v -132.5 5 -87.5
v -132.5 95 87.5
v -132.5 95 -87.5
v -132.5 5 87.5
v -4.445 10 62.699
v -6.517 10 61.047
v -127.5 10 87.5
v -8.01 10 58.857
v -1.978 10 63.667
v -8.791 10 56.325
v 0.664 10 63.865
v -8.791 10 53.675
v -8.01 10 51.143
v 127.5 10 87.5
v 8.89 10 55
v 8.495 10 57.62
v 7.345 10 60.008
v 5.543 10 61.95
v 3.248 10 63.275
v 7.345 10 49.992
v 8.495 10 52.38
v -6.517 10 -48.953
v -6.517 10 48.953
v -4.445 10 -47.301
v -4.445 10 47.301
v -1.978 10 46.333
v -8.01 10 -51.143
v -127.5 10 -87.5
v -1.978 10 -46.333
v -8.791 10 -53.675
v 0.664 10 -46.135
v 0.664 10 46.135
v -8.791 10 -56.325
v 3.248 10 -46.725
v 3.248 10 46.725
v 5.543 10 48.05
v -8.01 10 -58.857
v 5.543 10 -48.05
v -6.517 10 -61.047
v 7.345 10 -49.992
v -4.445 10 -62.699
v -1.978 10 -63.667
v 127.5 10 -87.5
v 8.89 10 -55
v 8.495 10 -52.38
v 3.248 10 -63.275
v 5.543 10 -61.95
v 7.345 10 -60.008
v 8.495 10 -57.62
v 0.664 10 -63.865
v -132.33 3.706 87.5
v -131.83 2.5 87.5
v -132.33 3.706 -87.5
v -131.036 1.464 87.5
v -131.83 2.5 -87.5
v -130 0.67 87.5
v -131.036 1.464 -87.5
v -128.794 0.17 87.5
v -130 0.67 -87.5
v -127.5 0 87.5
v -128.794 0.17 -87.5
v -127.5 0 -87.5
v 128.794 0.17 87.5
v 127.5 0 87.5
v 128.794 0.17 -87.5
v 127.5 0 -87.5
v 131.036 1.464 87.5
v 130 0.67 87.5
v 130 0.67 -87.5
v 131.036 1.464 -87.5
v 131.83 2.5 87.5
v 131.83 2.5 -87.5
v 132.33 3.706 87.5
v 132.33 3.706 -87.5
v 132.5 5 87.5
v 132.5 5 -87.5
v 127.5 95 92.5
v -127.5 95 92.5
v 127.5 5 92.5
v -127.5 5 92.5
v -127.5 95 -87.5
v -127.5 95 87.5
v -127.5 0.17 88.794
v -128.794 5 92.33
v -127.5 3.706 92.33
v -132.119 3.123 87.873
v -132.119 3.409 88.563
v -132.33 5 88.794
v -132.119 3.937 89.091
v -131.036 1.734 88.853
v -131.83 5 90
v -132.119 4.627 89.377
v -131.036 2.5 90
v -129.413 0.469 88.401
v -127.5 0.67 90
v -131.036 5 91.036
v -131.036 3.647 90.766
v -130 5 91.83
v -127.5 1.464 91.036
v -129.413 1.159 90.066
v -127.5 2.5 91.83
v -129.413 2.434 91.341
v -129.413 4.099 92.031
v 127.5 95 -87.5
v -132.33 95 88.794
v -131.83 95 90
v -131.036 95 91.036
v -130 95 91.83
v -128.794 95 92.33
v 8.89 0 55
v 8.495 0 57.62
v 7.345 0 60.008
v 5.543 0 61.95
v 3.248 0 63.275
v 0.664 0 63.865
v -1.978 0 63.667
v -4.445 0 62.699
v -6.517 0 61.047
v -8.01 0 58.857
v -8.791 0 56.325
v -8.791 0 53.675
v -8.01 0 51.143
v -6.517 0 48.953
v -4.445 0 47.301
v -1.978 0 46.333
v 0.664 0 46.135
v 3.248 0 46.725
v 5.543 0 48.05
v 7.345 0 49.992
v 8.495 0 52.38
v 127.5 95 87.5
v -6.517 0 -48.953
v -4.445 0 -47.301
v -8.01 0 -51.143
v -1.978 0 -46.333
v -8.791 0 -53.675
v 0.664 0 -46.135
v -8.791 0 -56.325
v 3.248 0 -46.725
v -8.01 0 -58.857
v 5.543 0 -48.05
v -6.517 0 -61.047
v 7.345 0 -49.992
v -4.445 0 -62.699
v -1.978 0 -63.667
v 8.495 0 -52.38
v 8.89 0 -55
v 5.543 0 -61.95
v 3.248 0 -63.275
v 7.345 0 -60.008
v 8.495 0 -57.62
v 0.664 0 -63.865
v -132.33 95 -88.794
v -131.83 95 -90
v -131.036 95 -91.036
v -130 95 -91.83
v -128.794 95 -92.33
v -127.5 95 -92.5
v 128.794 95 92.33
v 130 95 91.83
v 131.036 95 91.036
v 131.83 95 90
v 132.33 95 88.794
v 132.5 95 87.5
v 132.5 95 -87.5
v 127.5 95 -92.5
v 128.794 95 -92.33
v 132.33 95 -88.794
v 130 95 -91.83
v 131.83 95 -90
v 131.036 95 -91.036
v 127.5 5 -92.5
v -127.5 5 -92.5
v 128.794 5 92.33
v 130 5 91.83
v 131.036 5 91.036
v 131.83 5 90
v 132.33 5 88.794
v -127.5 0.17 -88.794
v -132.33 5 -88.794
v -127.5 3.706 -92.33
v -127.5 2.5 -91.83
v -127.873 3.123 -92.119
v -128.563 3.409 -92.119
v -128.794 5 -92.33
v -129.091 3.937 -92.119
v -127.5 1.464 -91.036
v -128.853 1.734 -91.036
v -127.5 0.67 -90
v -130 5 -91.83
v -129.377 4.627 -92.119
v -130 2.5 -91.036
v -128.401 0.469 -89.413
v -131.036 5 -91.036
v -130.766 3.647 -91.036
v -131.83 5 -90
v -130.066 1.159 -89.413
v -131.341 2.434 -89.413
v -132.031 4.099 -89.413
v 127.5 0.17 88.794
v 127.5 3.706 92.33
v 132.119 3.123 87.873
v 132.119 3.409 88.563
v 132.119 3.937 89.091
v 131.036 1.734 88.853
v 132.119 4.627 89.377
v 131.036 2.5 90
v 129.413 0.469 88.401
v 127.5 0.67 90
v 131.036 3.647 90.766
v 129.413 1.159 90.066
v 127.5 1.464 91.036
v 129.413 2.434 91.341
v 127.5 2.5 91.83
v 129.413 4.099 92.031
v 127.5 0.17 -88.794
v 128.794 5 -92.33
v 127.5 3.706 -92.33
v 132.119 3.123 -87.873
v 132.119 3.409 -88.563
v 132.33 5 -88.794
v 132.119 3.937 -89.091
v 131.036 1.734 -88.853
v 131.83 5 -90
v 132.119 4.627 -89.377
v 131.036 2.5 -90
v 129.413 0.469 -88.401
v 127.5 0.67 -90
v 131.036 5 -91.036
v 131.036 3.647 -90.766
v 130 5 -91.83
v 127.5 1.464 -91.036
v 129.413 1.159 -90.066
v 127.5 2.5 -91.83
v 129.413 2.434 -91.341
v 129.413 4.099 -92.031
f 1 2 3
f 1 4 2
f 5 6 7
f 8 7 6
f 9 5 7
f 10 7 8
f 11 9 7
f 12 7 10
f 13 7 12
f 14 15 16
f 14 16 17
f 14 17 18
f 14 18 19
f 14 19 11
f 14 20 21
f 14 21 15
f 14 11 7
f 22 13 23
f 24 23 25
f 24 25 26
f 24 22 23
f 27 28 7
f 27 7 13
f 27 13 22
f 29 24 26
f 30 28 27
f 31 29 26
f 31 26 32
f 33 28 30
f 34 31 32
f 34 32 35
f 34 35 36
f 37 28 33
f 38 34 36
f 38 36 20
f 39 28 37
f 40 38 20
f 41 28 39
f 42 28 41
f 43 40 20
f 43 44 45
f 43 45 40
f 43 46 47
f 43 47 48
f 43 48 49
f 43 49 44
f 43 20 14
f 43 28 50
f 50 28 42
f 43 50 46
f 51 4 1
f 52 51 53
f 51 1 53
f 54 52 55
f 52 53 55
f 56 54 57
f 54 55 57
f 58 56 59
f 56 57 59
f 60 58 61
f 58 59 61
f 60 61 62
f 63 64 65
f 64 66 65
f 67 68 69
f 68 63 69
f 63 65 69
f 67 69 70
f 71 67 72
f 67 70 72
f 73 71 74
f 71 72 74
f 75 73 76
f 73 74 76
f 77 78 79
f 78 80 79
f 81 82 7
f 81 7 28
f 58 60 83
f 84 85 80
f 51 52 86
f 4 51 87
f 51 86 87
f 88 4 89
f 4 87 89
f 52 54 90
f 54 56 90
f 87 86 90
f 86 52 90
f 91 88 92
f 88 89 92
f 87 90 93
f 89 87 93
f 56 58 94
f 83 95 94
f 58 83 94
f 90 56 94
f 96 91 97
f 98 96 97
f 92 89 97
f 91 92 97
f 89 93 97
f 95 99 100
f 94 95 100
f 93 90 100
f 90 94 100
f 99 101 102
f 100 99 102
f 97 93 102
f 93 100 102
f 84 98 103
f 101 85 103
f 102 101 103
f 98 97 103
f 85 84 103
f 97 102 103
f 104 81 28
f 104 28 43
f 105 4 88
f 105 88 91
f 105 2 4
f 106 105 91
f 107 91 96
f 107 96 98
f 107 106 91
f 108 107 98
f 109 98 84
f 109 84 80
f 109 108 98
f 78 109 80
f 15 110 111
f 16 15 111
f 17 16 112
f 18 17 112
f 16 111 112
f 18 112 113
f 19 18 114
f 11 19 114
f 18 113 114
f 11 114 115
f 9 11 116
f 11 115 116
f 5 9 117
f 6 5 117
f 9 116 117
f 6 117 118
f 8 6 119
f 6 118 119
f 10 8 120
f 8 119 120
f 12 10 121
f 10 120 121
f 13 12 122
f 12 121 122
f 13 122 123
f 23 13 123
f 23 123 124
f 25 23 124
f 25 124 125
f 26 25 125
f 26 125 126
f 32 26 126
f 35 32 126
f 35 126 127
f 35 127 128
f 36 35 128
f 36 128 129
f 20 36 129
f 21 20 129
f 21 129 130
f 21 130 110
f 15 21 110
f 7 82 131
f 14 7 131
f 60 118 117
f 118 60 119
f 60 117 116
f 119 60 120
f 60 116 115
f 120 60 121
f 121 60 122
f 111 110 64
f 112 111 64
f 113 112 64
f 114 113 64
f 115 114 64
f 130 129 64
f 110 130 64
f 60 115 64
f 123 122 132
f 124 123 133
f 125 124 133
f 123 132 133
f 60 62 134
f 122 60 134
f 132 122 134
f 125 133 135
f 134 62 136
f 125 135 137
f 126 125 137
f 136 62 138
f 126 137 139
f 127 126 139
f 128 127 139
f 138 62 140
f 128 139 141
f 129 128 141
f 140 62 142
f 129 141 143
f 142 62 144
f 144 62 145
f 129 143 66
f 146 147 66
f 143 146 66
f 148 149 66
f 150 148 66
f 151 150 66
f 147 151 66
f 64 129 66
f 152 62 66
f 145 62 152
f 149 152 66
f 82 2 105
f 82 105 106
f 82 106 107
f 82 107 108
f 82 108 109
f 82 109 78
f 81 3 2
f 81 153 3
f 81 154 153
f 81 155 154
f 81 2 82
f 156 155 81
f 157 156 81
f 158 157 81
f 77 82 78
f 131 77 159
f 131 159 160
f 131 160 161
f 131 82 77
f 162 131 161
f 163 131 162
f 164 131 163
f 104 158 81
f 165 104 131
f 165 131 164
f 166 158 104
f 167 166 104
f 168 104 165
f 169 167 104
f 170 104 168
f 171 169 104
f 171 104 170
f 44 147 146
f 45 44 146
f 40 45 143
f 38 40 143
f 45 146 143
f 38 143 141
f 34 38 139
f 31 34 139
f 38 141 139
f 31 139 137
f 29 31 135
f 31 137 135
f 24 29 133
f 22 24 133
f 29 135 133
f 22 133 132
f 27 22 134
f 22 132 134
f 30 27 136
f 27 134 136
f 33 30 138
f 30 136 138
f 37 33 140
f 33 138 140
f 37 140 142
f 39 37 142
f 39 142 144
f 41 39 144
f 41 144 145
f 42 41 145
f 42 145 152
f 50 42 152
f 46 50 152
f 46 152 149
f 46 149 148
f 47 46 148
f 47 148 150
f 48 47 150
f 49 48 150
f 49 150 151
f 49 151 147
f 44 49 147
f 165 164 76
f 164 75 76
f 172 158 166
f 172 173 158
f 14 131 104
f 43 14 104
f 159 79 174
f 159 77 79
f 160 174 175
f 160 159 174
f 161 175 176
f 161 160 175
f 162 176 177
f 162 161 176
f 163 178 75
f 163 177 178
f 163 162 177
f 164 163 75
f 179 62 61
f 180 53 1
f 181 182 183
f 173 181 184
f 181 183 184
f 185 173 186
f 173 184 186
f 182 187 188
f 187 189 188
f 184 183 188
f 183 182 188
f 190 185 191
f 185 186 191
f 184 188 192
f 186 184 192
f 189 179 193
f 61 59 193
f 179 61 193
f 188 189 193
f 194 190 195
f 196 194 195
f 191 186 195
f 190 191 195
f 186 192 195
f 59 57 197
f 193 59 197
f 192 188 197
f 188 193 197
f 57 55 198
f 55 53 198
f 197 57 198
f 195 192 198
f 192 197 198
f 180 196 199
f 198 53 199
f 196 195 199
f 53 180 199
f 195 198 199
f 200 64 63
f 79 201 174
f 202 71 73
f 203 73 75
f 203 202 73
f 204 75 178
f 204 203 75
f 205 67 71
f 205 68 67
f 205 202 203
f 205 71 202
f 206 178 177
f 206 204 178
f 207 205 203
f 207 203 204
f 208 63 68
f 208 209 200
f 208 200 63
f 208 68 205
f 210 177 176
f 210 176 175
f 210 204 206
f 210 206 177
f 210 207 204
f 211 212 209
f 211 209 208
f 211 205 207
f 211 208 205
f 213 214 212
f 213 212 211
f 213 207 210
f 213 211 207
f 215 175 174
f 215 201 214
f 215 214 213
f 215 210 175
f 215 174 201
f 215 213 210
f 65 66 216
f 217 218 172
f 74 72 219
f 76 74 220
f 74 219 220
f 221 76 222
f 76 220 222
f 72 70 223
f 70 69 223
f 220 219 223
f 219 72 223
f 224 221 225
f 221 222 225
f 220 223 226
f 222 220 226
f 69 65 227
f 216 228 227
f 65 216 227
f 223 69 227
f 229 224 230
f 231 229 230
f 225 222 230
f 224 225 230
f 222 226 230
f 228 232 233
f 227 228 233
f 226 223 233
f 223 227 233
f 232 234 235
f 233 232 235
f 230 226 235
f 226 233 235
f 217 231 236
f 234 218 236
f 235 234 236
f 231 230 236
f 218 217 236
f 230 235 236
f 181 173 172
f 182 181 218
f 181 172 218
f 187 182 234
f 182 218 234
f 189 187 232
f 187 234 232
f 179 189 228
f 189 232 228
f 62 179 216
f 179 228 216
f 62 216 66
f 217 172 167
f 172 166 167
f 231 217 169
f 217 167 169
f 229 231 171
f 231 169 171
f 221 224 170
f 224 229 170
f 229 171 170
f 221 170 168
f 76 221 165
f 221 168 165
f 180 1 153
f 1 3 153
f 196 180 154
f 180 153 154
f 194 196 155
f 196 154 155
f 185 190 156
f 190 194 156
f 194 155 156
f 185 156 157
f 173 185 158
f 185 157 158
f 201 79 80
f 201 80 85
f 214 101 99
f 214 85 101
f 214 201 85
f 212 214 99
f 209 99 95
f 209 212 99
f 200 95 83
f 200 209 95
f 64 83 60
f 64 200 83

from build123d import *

# Parameters (mm, degrees)
SKETCH1_W           = 265
SKETCH1_H           = 185
BOSS_EXTRUDE1_DEPTH = 95
SKETCH2_W           = 255
SKETCH2_H           = 175
CUT_EXTRUDE1_DEPTH  = 85
CUT_EXTRUDE2_REACH  = 97
SKETCH6_R           = 8.89
FILLET1_R           = 5


with BuildPart() as part:
    # Sketch1 → Boss-Extrude1 (new body)
    with BuildSketch(Plane(origin=(0, 0, 0), x_dir=(1, 0, 0), z_dir=(0, 1, 0))):
        Rectangle(SKETCH1_W, SKETCH1_H)
    extrude(amount=BOSS_EXTRUDE1_DEPTH)

    # Sketch2 → Cut-Extrude1 (cut)
    with BuildSketch(Plane(origin=(0, 95, 0), x_dir=(1, 0, 0), z_dir=(0, 1, 0))):
        Rectangle(SKETCH2_W, SKETCH2_H)
    extrude(amount=-CUT_EXTRUDE1_DEPTH, mode=Mode.SUBTRACT)

    # Sketch6 → Cut-Extrude2 (cut, up to next)
    with BuildSketch(Plane.XZ, mode=Mode.PRIVATE) as cut_extrude2_sk1:
        with Locations((0, 55)):
            Circle(SKETCH6_R)
    cut_extrude2_tool1 = extrude(cut_extrude2_sk1.sketch, amount=-CUT_EXTRUDE2_REACH, mode=Mode.PRIVATE) & part.part
    add(cut_extrude2_tool1.solids().sort_by_distance((0, 0, 55))[0], mode=Mode.SUBTRACT)
    # Sketch6 → Cut-Extrude2 (cut, up to next)
    with BuildSketch(Plane.XZ, mode=Mode.PRIVATE) as cut_extrude2_sk2:
        with Locations((0, -55)):
            Circle(SKETCH6_R)
    cut_extrude2_tool2 = extrude(cut_extrude2_sk2.sketch, amount=-CUT_EXTRUDE2_REACH, mode=Mode.PRIVATE) & part.part
    add(cut_extrude2_tool2.solids().sort_by_distance((0, 0, -55))[0], mode=Mode.SUBTRACT)

    # Fillet1
    fillet1_edges = [part.edges().sort_by_distance(p)[0] for p in [
        (0, 0, 92.5),
        (-132.5, 0, 0),
        (0, 0, -92.5),
        (132.5, 0, 0),
        (132.5, 47.5, 92.5),
        (-132.5, 47.5, 92.5),
        (-132.5, 47.5, -92.5),
        (132.5, 47.5, -92.5),
    ]]
    fillet(fillet1_edges, radius=FILLET1_R)


solid = part.part
